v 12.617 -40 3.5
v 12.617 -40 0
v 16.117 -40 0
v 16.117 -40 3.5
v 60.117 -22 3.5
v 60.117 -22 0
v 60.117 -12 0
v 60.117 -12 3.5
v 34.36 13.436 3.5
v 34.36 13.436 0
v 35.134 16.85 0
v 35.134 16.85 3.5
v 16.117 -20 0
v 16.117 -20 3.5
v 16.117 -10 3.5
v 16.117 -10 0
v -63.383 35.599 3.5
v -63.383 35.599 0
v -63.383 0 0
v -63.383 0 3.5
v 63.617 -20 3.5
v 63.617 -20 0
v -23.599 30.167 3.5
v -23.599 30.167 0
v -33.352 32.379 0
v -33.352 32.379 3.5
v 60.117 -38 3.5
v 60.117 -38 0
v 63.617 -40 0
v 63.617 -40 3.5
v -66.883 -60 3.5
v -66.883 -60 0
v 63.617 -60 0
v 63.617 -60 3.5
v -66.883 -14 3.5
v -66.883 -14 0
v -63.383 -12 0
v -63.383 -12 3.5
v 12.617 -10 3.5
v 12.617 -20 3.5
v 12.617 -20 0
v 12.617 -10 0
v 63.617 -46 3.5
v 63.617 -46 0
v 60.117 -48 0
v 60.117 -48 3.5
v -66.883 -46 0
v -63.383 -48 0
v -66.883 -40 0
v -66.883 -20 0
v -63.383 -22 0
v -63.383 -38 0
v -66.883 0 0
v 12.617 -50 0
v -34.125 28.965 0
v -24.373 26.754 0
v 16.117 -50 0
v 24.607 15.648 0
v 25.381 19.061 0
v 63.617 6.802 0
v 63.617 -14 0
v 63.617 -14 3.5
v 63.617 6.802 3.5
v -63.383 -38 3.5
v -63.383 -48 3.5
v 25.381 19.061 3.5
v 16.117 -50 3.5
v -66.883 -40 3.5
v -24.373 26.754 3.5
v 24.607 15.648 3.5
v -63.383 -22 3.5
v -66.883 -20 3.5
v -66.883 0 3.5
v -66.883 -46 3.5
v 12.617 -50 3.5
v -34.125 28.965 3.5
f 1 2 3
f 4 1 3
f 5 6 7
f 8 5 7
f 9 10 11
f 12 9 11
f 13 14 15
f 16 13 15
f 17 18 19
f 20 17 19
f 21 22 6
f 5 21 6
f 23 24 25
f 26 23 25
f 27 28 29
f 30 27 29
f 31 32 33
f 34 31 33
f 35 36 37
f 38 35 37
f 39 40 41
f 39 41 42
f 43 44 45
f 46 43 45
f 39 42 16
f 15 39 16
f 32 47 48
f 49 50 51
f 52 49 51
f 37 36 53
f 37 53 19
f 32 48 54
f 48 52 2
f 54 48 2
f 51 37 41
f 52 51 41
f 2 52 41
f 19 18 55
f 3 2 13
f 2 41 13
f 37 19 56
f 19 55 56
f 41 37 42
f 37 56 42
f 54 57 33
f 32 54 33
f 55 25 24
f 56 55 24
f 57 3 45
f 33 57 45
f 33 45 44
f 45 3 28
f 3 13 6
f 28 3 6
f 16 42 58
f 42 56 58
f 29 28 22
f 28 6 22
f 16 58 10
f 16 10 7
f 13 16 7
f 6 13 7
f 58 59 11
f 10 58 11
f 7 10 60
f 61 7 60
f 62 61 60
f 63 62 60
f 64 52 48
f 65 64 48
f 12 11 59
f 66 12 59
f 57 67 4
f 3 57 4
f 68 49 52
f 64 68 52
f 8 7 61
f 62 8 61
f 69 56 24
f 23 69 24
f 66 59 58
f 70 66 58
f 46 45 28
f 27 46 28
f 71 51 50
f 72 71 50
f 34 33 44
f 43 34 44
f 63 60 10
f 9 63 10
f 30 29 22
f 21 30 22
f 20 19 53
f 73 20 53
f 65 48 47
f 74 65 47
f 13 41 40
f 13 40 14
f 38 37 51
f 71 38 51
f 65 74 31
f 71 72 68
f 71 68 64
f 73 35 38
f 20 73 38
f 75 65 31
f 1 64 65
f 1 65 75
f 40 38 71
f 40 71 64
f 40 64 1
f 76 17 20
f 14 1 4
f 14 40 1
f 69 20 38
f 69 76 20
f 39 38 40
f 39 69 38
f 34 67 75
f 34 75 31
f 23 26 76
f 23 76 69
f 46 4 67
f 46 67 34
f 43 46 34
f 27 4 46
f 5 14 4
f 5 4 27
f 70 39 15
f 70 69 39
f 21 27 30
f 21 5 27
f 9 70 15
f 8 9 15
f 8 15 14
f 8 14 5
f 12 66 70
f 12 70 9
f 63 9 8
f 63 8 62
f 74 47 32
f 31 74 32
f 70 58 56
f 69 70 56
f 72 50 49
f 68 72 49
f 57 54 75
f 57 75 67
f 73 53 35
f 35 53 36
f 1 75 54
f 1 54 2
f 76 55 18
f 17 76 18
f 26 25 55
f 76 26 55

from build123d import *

# Parameters (mm, degrees)
F1_DEPTH = 3.5
F2_W     = 3.5
F2_H     = 10
F3_DEPTH = 3.5


with BuildPart() as f1:
    # F0 (on Top) → F1 (new body)
    with BuildSketch(Plane.XY):
        Polygon((63.617211, -14), (63.617211, 0), (63.617211, 6.802419), (34.359907, 13.436434), (35.133875, 16.849786), (25.38144, 19.061125), (24.607472, 15.647772), (-24.37305, 26.753974), (-23.599082, 30.167326), (-33.351517, 32.378664), (-34.125485, 28.965312), (-63.382789, 35.599327), (-63.382789, 0), (-66.882789, 0), (-66.882789, -14), (-63.382789, -12), (-63.382789, -22), (-66.882789, -20), (-66.882789, -40), (-63.382789, -38), (-63.382789, -48), (-66.882789, -46), (-66.882789, -60), (-63.382789, -60), (60.117211, -60), (63.617211, -60), (63.617211, -46), (60.117211, -48), (60.117211, -38), (63.617211, -40), (63.617211, -20), (60.117211, -22), (60.117211, -12), align=None)
    extrude(amount=F1_DEPTH)

    # F2 (on face) → F3 (cut)
    with BuildSketch(Plane.XY.offset(3.5)):
        with Locations((14.367211, -15)):
            Rectangle(F2_W, F2_H)
        with Locations((14.367211, -45)):
            Rectangle(F2_W, F2_H)
    extrude(amount=-F3_DEPTH, mode=Mode.SUBTRACT)


solid = f1.part
